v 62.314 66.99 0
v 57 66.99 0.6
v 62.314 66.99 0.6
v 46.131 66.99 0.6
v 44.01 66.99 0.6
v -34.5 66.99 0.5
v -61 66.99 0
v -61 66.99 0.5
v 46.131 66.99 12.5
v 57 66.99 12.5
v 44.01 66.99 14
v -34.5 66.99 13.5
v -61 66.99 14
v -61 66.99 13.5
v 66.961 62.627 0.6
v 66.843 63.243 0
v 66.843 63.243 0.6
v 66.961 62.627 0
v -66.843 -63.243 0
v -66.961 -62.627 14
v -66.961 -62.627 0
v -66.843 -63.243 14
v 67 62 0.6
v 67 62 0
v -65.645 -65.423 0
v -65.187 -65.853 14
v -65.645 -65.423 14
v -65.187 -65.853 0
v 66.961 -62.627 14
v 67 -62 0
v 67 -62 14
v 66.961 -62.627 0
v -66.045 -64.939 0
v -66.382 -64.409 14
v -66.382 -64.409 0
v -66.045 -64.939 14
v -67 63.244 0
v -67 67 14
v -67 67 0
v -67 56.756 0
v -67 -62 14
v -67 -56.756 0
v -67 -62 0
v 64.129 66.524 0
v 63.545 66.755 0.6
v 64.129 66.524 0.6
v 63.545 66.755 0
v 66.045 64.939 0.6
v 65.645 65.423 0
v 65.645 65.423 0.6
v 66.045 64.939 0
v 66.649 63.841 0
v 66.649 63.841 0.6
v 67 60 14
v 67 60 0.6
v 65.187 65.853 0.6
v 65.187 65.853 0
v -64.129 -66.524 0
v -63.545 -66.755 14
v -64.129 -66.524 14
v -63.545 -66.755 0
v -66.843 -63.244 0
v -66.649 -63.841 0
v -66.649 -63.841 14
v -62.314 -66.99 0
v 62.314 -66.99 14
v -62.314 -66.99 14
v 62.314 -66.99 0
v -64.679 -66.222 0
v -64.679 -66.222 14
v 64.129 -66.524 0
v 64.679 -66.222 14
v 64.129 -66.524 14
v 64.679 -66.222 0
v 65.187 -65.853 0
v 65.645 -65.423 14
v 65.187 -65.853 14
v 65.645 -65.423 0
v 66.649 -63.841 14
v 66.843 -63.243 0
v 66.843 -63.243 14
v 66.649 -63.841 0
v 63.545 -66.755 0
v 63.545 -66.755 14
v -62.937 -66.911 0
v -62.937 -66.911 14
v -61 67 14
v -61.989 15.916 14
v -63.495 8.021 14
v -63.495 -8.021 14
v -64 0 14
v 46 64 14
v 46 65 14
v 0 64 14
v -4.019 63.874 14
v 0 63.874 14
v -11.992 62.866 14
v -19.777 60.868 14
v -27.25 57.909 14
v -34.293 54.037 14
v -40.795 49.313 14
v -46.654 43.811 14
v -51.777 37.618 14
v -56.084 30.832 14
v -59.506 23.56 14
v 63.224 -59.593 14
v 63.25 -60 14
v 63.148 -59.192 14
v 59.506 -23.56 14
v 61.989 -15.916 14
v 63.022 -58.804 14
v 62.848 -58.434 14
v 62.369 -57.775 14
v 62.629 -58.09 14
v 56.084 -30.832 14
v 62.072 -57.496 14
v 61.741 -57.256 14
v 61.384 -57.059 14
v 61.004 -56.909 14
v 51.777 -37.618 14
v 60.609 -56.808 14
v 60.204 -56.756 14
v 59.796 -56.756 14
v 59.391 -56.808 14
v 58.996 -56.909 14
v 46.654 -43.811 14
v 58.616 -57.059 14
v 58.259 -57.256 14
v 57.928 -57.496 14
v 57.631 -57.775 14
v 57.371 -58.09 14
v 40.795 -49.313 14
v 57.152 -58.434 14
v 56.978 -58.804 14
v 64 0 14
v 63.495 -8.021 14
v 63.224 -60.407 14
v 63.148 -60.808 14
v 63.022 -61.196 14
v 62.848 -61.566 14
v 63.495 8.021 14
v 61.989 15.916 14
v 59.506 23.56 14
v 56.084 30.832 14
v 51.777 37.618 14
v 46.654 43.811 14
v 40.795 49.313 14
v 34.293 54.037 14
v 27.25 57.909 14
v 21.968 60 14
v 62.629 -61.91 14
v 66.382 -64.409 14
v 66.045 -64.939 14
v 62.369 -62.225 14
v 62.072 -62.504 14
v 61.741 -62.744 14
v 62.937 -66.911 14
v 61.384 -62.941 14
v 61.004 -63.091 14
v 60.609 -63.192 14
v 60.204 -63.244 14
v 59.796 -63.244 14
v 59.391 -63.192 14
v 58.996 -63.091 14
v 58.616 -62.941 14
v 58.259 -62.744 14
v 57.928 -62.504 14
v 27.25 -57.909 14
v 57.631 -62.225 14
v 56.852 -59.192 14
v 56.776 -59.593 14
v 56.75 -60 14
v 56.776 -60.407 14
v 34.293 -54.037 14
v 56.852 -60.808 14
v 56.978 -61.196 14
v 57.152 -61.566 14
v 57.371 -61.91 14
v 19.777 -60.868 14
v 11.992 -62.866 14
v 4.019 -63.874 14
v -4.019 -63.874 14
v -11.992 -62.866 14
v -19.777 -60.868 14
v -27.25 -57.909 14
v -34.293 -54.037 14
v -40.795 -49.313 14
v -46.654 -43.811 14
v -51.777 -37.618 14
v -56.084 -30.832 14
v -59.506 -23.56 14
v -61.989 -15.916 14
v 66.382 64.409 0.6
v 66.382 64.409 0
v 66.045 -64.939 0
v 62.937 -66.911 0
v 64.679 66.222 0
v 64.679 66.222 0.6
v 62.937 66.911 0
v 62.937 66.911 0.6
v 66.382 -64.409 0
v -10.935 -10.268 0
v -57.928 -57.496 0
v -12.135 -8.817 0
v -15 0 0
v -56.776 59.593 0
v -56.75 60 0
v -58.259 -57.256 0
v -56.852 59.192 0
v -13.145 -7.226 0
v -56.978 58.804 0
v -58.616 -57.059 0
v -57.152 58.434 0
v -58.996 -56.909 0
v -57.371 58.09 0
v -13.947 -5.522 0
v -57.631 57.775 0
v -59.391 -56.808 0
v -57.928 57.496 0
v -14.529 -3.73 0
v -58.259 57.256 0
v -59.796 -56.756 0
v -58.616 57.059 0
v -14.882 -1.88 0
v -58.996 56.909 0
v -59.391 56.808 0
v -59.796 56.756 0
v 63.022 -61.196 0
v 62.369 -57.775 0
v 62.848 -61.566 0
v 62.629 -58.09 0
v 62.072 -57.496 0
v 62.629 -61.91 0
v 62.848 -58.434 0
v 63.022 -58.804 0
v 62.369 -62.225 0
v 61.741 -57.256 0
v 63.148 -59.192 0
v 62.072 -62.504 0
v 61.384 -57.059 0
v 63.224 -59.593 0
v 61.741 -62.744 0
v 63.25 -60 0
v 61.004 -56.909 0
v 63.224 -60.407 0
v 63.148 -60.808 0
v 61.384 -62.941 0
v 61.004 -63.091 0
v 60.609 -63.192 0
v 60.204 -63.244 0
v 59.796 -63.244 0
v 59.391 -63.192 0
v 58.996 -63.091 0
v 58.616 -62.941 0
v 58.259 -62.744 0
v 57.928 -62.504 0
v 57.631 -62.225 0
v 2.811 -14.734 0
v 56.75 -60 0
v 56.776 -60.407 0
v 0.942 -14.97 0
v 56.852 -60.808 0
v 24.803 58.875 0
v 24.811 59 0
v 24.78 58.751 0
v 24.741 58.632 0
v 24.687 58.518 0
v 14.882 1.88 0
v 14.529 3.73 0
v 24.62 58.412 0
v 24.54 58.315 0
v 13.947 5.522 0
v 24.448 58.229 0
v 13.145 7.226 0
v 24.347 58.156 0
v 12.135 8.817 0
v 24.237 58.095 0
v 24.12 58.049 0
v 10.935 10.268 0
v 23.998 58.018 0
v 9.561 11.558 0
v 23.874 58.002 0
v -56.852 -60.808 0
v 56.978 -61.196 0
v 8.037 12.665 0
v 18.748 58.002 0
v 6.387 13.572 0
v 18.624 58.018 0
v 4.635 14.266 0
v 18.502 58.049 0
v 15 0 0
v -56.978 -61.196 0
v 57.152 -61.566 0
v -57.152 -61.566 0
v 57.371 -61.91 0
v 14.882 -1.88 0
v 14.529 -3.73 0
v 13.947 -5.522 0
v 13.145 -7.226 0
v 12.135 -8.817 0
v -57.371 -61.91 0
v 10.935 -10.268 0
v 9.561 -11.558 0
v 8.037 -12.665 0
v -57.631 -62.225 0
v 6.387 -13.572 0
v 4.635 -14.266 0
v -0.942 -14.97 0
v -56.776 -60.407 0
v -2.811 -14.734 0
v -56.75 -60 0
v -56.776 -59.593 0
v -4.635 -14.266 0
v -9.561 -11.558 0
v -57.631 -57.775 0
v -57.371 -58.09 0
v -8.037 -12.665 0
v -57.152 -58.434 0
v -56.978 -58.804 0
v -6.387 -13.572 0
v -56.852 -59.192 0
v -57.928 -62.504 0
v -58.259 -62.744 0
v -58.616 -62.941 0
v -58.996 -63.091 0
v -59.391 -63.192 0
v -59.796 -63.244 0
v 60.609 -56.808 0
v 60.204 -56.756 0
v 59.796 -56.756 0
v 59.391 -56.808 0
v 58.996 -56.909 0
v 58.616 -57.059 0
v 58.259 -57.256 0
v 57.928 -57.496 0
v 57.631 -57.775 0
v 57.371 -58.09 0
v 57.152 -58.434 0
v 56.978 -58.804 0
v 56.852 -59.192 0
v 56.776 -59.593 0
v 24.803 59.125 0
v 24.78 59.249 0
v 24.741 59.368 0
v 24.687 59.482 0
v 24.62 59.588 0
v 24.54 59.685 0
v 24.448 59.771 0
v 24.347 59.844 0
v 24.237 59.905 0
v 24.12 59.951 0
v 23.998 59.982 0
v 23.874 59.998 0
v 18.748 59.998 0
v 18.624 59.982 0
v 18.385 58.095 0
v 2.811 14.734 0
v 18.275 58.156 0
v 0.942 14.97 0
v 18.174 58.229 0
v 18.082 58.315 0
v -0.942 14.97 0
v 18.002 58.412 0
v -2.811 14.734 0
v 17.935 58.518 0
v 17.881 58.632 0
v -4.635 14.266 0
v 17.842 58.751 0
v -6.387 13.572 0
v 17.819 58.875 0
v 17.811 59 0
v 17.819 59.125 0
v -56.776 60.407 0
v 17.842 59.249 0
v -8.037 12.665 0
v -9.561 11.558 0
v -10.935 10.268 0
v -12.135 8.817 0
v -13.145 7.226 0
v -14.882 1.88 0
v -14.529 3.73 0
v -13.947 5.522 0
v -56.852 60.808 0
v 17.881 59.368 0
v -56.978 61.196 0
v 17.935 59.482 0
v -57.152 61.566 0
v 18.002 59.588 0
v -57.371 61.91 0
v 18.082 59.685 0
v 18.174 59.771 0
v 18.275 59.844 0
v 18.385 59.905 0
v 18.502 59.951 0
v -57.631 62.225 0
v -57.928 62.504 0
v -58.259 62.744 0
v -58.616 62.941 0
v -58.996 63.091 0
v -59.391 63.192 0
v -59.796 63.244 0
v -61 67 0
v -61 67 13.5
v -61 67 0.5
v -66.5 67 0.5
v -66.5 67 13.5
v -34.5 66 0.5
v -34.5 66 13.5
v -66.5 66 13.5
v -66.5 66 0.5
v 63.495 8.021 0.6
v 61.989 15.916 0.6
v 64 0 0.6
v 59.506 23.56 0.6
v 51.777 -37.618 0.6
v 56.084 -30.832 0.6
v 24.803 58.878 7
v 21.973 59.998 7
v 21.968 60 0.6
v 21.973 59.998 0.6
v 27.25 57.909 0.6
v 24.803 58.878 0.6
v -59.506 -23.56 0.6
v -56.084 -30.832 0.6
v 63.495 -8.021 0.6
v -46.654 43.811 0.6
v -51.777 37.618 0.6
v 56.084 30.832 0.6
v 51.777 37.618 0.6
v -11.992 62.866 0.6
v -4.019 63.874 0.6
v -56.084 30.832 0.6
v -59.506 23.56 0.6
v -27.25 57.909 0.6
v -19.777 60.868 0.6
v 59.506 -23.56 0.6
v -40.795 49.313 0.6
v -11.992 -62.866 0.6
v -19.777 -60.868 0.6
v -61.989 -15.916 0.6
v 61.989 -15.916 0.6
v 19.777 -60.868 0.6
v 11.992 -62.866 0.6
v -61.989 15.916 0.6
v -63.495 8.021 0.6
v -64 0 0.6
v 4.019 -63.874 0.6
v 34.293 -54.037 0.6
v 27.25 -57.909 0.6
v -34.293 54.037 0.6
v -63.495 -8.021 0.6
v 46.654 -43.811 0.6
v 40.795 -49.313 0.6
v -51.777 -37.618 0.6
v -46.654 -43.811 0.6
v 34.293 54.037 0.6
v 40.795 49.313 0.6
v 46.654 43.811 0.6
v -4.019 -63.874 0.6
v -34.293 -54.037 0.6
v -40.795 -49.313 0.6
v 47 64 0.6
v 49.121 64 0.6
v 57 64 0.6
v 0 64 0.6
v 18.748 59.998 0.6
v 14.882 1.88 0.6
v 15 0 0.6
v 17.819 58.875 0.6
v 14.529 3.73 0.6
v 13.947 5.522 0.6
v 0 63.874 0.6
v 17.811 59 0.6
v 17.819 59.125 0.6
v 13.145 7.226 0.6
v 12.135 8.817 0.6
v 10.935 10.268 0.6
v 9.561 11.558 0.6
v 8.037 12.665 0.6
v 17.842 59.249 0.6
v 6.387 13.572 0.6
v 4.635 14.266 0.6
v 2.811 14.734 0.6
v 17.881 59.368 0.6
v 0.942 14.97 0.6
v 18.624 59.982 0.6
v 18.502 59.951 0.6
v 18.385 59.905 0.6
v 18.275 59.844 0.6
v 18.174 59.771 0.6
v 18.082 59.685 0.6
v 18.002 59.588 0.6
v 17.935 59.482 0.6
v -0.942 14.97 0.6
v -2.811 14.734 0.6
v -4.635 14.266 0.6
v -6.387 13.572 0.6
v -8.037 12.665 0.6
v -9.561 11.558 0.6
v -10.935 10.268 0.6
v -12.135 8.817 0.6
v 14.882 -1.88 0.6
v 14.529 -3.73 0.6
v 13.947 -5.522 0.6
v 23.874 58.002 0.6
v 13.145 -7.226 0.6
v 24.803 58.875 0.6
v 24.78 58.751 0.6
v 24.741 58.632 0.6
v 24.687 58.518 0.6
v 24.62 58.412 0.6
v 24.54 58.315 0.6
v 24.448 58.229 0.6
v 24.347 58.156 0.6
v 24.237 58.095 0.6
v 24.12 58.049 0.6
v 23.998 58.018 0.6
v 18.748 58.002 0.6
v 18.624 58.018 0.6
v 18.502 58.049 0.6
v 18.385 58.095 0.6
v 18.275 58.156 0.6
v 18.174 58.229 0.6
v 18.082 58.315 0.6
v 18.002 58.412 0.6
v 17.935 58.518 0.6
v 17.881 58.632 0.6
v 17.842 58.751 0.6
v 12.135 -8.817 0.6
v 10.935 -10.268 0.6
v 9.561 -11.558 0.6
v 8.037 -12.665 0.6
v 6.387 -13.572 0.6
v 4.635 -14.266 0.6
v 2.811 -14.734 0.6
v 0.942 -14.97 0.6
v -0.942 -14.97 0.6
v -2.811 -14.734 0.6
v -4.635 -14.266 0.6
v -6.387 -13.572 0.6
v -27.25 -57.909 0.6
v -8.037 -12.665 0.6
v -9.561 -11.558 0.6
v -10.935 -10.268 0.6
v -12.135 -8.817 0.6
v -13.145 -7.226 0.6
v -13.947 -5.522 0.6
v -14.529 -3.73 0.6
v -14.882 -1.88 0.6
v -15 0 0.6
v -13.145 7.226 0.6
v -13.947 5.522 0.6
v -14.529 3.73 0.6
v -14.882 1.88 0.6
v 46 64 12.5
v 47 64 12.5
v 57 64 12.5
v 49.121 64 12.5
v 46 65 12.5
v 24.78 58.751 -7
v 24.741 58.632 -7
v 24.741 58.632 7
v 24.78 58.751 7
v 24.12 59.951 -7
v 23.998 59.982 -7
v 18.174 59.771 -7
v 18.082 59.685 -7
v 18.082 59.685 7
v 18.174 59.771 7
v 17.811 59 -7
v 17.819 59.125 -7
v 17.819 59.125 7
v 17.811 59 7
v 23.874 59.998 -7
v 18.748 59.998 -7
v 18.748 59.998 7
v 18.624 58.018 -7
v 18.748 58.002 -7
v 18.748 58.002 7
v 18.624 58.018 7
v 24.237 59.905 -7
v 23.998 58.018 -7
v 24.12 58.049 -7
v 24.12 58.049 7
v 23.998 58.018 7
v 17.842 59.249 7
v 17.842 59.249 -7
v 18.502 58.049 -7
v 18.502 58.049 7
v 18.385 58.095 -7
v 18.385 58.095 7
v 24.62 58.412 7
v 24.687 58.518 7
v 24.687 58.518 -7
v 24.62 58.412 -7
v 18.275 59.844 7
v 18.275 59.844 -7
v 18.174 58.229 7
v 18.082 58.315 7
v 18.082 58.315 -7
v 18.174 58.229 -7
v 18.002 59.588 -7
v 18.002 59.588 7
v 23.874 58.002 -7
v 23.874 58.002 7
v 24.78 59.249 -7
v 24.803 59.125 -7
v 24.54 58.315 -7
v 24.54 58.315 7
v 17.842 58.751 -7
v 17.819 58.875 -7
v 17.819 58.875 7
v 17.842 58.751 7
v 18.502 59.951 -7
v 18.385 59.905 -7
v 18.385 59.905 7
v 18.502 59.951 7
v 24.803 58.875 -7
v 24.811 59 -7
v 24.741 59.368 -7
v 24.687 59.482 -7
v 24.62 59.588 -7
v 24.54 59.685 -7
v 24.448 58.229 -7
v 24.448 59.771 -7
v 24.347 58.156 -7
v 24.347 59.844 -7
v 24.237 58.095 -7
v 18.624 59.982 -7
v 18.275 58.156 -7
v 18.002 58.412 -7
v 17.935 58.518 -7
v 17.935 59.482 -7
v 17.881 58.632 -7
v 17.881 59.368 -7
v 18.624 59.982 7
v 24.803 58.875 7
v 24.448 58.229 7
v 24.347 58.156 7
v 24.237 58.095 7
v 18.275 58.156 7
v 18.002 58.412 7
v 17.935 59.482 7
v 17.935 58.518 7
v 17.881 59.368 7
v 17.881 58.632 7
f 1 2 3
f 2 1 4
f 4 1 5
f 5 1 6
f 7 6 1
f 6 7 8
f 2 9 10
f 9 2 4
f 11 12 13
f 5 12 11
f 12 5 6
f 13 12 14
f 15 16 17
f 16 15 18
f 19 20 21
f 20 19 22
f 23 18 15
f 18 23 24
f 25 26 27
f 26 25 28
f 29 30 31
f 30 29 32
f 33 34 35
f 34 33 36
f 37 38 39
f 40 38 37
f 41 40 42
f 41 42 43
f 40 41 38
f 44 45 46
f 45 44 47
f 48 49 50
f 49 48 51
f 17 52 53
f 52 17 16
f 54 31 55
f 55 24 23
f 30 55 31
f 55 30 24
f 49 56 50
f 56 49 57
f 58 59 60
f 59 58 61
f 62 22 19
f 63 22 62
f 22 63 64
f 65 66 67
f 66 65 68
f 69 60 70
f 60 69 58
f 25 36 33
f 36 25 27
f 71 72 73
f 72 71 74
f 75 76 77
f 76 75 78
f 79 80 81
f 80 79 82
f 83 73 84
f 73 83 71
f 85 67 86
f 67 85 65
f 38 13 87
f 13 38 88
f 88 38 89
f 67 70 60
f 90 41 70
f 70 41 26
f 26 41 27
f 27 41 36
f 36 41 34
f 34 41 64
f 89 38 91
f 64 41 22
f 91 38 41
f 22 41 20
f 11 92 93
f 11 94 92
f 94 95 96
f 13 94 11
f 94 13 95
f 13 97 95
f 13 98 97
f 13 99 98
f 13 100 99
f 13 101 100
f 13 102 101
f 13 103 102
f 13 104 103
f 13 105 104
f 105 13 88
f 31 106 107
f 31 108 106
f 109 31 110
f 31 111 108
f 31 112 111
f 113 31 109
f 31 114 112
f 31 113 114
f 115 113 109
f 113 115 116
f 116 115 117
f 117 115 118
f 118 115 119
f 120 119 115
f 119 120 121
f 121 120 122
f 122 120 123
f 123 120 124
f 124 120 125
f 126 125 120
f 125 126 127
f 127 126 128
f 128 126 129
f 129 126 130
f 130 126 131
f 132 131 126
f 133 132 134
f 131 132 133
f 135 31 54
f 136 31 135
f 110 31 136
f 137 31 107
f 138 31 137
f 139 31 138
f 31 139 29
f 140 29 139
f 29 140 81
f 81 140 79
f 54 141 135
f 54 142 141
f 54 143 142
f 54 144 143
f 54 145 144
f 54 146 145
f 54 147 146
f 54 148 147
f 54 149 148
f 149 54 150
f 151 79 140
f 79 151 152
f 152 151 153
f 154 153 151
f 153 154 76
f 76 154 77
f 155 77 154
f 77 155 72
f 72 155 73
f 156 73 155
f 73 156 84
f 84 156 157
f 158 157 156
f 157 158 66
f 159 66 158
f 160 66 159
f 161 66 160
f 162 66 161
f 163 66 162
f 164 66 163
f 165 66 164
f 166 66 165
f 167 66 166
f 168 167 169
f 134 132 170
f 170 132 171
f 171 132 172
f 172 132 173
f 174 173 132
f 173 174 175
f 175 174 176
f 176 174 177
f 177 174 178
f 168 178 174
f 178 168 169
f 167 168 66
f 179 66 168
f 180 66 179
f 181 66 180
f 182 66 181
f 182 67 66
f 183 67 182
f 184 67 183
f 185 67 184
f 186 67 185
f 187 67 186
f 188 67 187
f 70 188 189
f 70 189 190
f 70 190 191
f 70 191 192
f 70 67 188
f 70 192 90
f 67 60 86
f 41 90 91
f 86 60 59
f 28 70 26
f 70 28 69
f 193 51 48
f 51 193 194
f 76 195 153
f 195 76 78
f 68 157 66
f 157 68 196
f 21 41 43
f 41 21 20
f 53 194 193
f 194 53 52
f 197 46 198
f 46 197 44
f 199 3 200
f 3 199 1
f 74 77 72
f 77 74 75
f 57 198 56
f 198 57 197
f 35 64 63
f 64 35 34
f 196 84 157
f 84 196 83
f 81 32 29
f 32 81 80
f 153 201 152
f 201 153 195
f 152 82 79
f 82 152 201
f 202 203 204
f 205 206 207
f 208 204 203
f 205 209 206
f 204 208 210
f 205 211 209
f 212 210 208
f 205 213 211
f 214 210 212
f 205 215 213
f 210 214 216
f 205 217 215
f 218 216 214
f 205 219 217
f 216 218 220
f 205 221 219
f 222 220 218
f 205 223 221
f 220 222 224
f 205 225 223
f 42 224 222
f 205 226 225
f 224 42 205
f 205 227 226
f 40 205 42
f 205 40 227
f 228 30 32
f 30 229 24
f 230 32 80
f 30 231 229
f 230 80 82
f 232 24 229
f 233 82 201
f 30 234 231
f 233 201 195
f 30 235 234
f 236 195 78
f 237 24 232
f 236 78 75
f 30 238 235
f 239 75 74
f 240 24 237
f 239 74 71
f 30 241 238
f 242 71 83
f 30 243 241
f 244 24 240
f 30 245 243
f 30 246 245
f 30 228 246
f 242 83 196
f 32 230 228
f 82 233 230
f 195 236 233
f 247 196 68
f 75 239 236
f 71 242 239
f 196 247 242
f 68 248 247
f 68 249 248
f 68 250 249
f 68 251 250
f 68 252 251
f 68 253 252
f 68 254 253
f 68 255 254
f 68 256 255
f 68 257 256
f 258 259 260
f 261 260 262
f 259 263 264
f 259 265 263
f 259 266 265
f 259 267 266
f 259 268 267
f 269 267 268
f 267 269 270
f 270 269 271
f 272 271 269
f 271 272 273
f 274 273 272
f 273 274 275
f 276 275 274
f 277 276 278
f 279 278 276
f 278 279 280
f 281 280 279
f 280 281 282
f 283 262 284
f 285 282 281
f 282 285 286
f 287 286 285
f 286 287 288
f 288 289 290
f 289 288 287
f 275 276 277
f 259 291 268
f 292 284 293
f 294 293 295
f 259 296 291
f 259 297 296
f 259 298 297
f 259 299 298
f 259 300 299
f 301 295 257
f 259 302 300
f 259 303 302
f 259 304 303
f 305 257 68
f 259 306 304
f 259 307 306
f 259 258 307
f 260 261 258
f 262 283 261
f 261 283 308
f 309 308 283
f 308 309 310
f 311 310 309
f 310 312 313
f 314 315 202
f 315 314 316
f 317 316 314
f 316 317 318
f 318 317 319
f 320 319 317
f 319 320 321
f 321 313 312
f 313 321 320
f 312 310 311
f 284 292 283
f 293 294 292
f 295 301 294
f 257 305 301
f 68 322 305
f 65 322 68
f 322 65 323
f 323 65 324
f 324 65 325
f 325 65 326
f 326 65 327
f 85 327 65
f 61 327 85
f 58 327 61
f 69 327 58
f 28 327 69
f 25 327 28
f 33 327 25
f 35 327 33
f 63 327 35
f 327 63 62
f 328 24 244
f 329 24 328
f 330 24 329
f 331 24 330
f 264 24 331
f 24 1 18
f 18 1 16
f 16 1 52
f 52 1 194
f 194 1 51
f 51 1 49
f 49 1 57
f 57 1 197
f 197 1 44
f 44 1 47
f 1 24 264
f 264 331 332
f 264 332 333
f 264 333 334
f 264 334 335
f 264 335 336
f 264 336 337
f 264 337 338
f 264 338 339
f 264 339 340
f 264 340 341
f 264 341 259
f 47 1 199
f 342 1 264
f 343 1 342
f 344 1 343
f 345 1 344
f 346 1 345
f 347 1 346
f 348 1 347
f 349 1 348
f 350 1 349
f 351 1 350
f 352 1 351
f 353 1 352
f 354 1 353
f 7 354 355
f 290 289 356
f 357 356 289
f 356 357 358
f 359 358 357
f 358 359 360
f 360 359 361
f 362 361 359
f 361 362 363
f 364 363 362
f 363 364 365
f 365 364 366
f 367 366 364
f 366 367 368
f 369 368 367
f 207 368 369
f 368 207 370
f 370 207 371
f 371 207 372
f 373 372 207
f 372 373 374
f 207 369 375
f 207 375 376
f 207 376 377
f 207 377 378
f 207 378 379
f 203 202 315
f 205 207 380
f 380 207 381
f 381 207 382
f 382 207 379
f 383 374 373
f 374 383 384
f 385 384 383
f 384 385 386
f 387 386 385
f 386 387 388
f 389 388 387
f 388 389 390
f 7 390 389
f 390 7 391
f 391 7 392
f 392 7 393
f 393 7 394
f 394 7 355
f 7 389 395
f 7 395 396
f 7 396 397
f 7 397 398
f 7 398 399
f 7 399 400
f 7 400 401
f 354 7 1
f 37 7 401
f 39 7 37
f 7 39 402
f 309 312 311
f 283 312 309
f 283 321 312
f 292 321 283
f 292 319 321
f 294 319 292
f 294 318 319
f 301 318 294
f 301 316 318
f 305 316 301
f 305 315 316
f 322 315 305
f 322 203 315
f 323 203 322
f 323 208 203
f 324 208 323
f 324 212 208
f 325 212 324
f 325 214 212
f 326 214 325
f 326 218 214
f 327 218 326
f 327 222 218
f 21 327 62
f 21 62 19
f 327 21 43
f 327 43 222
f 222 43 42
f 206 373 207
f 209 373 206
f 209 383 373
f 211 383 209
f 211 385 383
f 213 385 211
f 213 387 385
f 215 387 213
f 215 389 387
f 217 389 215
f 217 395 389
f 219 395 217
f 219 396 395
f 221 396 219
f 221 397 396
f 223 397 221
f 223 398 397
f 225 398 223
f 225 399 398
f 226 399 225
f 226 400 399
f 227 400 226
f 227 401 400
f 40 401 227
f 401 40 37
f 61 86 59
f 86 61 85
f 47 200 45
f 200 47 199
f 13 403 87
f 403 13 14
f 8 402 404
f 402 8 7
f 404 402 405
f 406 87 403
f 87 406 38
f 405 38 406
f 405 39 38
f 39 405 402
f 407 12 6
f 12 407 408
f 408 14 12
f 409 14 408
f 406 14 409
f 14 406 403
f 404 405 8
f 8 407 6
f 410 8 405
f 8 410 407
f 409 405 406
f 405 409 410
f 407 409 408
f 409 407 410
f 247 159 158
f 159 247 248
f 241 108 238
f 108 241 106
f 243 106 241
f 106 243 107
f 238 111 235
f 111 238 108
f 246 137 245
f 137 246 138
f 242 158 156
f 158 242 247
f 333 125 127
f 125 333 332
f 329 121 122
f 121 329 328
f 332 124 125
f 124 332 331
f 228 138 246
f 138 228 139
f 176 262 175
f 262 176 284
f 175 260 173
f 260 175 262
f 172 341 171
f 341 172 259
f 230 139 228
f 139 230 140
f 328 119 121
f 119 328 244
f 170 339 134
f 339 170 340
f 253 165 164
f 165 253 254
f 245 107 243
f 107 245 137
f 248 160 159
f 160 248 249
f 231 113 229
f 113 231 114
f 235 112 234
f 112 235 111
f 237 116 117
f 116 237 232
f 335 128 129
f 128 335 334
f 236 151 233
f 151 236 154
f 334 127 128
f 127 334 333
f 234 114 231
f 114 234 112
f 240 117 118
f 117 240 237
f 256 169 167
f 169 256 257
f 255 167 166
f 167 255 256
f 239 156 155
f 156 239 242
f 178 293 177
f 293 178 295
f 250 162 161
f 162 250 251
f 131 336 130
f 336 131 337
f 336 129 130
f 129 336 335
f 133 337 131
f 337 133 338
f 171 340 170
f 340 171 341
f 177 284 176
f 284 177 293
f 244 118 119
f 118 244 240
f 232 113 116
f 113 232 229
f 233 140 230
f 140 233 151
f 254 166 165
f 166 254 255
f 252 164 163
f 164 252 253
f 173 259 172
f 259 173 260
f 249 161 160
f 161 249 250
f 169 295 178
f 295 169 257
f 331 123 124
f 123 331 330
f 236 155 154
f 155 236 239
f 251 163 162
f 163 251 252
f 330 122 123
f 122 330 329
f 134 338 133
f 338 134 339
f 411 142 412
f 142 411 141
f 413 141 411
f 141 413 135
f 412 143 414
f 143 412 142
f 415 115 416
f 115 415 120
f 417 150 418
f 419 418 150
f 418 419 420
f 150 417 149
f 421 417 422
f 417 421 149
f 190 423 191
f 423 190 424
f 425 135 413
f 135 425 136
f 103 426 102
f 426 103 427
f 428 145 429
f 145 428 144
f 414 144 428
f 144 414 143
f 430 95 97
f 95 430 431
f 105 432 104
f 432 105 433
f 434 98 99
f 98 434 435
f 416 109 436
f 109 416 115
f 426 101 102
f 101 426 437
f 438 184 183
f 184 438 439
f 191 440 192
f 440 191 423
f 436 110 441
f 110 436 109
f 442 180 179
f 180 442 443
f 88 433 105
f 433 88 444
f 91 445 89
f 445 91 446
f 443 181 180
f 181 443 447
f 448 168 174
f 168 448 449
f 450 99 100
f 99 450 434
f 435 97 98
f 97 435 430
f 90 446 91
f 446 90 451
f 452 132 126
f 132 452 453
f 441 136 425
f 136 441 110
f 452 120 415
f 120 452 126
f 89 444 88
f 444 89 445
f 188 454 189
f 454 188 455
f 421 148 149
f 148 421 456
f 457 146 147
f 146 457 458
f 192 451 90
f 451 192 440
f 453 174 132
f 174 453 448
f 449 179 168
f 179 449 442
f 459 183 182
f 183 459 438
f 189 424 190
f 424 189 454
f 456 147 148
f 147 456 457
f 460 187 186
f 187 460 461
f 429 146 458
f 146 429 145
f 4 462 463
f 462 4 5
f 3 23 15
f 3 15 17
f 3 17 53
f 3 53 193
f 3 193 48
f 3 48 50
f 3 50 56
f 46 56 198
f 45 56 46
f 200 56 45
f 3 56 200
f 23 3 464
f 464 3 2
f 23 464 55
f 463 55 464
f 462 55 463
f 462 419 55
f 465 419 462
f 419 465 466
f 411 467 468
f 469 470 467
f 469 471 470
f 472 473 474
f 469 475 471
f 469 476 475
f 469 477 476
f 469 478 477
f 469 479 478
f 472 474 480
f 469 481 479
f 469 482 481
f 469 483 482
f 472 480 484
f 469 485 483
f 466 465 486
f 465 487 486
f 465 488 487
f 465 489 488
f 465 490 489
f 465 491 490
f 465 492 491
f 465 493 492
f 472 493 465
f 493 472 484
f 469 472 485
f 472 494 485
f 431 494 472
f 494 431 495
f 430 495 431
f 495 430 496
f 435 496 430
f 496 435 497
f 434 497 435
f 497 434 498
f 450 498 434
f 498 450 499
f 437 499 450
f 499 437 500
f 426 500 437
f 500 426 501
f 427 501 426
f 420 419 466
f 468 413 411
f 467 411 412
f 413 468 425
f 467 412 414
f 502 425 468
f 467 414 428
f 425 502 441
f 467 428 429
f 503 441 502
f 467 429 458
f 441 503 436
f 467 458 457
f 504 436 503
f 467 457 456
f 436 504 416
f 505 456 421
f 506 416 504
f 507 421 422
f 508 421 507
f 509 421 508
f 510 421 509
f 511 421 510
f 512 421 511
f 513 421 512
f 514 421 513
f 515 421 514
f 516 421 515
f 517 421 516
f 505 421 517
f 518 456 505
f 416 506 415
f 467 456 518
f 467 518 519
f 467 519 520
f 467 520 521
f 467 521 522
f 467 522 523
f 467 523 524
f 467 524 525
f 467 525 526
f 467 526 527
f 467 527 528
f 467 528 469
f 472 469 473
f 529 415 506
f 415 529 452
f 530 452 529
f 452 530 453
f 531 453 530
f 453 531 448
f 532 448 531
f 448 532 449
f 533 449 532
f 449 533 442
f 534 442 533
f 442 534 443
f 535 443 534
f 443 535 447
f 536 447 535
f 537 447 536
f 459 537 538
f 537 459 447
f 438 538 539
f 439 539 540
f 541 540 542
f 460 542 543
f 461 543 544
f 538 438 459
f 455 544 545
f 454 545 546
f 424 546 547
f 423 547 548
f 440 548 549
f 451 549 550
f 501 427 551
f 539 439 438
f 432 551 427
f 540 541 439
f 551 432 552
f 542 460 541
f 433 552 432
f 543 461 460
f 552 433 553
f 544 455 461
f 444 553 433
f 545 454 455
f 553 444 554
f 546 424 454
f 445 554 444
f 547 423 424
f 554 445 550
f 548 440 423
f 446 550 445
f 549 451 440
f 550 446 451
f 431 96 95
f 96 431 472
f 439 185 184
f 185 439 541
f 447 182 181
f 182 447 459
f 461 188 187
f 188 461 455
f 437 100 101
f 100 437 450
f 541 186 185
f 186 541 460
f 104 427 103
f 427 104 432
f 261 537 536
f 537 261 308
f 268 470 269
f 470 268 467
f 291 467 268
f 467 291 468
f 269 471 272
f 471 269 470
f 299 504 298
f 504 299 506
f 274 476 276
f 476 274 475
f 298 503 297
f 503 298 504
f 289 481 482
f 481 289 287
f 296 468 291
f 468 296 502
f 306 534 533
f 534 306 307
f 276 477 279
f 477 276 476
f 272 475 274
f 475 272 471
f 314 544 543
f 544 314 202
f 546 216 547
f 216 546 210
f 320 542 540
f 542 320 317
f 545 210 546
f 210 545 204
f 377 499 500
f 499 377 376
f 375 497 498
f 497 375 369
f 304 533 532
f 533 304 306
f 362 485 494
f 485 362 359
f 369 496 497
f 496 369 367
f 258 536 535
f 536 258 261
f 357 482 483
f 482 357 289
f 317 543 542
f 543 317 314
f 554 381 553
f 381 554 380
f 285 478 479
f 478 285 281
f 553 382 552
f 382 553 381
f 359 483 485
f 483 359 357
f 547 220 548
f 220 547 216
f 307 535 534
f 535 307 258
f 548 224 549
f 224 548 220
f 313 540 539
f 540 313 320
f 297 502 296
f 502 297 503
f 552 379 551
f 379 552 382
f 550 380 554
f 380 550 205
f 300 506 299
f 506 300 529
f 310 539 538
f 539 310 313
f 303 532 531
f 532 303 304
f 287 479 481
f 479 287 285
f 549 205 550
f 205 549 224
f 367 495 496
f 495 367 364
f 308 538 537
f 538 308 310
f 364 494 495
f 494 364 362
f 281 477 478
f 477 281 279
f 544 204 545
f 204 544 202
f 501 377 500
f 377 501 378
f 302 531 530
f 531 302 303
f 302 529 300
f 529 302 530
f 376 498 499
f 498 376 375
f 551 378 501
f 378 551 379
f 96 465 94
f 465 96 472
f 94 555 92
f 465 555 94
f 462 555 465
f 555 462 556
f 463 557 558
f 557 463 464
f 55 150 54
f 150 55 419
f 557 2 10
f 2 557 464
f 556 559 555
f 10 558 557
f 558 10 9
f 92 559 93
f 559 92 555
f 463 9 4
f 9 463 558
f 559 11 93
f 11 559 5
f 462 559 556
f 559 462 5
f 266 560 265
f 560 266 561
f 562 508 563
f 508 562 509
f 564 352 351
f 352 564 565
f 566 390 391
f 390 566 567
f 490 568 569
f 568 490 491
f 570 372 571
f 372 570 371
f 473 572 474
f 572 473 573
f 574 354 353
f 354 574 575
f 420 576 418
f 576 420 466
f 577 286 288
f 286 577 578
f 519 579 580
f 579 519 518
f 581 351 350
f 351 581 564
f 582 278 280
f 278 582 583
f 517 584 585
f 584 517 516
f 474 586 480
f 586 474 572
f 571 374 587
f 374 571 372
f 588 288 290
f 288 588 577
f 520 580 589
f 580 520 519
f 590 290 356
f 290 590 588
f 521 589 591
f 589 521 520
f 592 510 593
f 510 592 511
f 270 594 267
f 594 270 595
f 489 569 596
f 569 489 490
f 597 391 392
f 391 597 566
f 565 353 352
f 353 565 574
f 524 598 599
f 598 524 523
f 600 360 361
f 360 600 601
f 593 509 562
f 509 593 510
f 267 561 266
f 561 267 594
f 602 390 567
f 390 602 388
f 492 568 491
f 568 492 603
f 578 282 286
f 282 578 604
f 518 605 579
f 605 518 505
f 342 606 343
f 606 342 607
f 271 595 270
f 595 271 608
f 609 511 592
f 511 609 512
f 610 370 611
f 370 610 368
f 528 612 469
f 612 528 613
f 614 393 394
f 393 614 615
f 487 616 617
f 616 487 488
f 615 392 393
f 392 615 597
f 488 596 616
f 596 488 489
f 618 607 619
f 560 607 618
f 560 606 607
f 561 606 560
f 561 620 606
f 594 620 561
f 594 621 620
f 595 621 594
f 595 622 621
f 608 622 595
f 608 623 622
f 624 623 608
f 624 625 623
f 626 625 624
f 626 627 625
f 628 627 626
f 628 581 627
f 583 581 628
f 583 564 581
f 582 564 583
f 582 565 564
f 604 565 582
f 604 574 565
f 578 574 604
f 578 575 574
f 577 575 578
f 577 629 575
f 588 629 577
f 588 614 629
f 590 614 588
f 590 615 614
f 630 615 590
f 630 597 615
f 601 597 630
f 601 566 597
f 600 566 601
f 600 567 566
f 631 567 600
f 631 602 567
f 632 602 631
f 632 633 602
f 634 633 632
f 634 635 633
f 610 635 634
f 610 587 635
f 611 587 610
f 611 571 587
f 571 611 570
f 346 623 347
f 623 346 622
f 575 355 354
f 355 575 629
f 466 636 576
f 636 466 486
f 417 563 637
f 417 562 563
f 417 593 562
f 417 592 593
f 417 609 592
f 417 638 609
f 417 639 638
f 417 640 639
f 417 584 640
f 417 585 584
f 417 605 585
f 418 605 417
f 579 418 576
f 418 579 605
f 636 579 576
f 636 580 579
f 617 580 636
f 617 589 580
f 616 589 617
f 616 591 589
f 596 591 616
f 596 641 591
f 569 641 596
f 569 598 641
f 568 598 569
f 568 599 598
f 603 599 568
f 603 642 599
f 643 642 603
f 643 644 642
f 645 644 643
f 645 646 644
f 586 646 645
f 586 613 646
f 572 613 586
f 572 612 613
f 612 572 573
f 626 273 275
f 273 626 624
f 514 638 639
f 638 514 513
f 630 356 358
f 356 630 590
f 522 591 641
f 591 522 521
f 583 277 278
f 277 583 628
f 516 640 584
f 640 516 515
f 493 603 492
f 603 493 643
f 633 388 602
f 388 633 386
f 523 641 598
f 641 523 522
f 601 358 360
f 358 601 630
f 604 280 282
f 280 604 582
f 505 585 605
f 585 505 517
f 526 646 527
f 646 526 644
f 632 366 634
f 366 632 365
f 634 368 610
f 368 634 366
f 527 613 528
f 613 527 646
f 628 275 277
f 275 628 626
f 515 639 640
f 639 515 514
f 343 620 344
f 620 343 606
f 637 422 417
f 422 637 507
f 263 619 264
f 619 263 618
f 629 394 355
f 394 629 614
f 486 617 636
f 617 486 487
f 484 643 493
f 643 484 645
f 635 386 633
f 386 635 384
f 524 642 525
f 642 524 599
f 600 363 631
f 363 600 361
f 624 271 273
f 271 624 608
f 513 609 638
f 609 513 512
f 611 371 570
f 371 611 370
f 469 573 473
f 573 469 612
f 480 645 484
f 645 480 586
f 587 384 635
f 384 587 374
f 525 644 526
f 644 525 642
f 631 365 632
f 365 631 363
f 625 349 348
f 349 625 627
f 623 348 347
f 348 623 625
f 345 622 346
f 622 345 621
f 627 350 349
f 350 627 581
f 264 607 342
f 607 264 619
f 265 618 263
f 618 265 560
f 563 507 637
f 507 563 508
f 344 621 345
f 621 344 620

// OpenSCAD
$fn = 50;


union() {
	difference() {
		union() {
			hull() {
				translate(v = [-62.0000000000, 62.0000000000, 0]) {
					cylinder(h = 14, r = 5);
				}
				translate(v = [62.0000000000, 62.0000000000, 0]) {
					cylinder(h = 14, r = 5);
				}
				translate(v = [-62.0000000000, -62.0000000000, 0]) {
					cylinder(h = 14, r = 5);
				}
				translate(v = [62.0000000000, -62.0000000000, 0]) {
					cylinder(h = 14, r = 5);
				}
			}
			translate(v = [-67.0000000000, 61.0000000000, 0]) {
				cube(size = [6, 6, 14]);
			}
		}
		union() {
			translate(v = [-67.5000000000, -60.0000000000, -250.0000000000]) {
				rotate(a = [0, 0, 0]) {
					difference() {
						union() {
							hull() {
								translate(v = [7.5000000000, 0, 0]) {
									cylinder(h = 250, r = 3.2500000000, r1 = 3.2500000000, r2 = 3.2500000000);
								}
								translate(v = [-7.5000000000, 0, 0]) {
									cylinder(h = 250, r = 3.2500000000, r1 = 3.2500000000, r2 = 3.2500000000);
								}
							}
						}
						union();
					}
				}
			}
			translate(v = [-67.5000000000, 60.0000000000, -250.0000000000]) {
				rotate(a = [0, 0, 0]) {
					difference() {
						union() {
							hull() {
								translate(v = [7.5000000000, 0, 0]) {
									cylinder(h = 250, r = 3.2500000000, r1 = 3.2500000000, r2 = 3.2500000000);
								}
								translate(v = [-7.5000000000, 0, 0]) {
									cylinder(h = 250, r = 3.2500000000, r1 = 3.2500000000, r2 = 3.2500000000);
								}
							}
						}
						union();
					}
				}
			}
			translate(v = [-66.5000000000, 66.0000000000, 0.5000000000]) {
				cube(size = [32, 1, 13.0000000000]);
			}
			translate(v = [60.0000000000, -60.0000000000, 0]) {
				cylinder(h = 100, r = 3.2500000000);
			}
			translate(v = [0, 0, 0.6000000000]) {
				cylinder(h = 16.4000000000, r = 64.0000000000);
			}
			translate(v = [0, 0, -7.0000000000]) {
				cylinder(h = 14, r = 15.0000000000);
			}
			translate(v = [0.0000000000, 60.0000000000, 0.6000000000]) {
				cube(size = [67.0000000000, 4, 16.4000000000]);
			}
			translate(v = [57.0000000000, 60.0000000000, 0.6000000000]) {
				cube(size = [10, 7, 16.4000000000]);
			}
			translate(v = [46.0000000000, 60.0000000000, 12.5000000000]) {
				cube(size = [21, 7, 1.5000000000]);
			}
			translate(v = [43.2500000000, 67.7500000000, 0.6000000000]) {
				rotate(a = [0, 0, -45]) {
					cube(size = [7.5000000000, 1.5000000000, 16.4000000000]);
				}
			}
			translate(v = [12.0610000000, 58.0000000000, 0.6000000000]) {
				cube(size = [7.5000000000, 2, 13.4000000000]);
			}
		}
	}
	union() {
		translate(v = [21.3110000000, 59.0000000000, -7.0000000000]) {
			rotate(a = [0, 0, 0]) {
				difference() {
					union() {
						#hull() {
							#translate(v = [2.5000000000, 0, 0]) {
								cylinder(h = 14, r = 1.0000000000, r1 = 1.0000000000, r2 = 1.0000000000);
							}
							#translate(v = [-2.5000000000, 0, 0]) {
								cylinder(h = 14, r = 1.0000000000, r1 = 1.0000000000, r2 = 1.0000000000);
							}
						}
					}
					union();
				}
			}
		}
	}
}
